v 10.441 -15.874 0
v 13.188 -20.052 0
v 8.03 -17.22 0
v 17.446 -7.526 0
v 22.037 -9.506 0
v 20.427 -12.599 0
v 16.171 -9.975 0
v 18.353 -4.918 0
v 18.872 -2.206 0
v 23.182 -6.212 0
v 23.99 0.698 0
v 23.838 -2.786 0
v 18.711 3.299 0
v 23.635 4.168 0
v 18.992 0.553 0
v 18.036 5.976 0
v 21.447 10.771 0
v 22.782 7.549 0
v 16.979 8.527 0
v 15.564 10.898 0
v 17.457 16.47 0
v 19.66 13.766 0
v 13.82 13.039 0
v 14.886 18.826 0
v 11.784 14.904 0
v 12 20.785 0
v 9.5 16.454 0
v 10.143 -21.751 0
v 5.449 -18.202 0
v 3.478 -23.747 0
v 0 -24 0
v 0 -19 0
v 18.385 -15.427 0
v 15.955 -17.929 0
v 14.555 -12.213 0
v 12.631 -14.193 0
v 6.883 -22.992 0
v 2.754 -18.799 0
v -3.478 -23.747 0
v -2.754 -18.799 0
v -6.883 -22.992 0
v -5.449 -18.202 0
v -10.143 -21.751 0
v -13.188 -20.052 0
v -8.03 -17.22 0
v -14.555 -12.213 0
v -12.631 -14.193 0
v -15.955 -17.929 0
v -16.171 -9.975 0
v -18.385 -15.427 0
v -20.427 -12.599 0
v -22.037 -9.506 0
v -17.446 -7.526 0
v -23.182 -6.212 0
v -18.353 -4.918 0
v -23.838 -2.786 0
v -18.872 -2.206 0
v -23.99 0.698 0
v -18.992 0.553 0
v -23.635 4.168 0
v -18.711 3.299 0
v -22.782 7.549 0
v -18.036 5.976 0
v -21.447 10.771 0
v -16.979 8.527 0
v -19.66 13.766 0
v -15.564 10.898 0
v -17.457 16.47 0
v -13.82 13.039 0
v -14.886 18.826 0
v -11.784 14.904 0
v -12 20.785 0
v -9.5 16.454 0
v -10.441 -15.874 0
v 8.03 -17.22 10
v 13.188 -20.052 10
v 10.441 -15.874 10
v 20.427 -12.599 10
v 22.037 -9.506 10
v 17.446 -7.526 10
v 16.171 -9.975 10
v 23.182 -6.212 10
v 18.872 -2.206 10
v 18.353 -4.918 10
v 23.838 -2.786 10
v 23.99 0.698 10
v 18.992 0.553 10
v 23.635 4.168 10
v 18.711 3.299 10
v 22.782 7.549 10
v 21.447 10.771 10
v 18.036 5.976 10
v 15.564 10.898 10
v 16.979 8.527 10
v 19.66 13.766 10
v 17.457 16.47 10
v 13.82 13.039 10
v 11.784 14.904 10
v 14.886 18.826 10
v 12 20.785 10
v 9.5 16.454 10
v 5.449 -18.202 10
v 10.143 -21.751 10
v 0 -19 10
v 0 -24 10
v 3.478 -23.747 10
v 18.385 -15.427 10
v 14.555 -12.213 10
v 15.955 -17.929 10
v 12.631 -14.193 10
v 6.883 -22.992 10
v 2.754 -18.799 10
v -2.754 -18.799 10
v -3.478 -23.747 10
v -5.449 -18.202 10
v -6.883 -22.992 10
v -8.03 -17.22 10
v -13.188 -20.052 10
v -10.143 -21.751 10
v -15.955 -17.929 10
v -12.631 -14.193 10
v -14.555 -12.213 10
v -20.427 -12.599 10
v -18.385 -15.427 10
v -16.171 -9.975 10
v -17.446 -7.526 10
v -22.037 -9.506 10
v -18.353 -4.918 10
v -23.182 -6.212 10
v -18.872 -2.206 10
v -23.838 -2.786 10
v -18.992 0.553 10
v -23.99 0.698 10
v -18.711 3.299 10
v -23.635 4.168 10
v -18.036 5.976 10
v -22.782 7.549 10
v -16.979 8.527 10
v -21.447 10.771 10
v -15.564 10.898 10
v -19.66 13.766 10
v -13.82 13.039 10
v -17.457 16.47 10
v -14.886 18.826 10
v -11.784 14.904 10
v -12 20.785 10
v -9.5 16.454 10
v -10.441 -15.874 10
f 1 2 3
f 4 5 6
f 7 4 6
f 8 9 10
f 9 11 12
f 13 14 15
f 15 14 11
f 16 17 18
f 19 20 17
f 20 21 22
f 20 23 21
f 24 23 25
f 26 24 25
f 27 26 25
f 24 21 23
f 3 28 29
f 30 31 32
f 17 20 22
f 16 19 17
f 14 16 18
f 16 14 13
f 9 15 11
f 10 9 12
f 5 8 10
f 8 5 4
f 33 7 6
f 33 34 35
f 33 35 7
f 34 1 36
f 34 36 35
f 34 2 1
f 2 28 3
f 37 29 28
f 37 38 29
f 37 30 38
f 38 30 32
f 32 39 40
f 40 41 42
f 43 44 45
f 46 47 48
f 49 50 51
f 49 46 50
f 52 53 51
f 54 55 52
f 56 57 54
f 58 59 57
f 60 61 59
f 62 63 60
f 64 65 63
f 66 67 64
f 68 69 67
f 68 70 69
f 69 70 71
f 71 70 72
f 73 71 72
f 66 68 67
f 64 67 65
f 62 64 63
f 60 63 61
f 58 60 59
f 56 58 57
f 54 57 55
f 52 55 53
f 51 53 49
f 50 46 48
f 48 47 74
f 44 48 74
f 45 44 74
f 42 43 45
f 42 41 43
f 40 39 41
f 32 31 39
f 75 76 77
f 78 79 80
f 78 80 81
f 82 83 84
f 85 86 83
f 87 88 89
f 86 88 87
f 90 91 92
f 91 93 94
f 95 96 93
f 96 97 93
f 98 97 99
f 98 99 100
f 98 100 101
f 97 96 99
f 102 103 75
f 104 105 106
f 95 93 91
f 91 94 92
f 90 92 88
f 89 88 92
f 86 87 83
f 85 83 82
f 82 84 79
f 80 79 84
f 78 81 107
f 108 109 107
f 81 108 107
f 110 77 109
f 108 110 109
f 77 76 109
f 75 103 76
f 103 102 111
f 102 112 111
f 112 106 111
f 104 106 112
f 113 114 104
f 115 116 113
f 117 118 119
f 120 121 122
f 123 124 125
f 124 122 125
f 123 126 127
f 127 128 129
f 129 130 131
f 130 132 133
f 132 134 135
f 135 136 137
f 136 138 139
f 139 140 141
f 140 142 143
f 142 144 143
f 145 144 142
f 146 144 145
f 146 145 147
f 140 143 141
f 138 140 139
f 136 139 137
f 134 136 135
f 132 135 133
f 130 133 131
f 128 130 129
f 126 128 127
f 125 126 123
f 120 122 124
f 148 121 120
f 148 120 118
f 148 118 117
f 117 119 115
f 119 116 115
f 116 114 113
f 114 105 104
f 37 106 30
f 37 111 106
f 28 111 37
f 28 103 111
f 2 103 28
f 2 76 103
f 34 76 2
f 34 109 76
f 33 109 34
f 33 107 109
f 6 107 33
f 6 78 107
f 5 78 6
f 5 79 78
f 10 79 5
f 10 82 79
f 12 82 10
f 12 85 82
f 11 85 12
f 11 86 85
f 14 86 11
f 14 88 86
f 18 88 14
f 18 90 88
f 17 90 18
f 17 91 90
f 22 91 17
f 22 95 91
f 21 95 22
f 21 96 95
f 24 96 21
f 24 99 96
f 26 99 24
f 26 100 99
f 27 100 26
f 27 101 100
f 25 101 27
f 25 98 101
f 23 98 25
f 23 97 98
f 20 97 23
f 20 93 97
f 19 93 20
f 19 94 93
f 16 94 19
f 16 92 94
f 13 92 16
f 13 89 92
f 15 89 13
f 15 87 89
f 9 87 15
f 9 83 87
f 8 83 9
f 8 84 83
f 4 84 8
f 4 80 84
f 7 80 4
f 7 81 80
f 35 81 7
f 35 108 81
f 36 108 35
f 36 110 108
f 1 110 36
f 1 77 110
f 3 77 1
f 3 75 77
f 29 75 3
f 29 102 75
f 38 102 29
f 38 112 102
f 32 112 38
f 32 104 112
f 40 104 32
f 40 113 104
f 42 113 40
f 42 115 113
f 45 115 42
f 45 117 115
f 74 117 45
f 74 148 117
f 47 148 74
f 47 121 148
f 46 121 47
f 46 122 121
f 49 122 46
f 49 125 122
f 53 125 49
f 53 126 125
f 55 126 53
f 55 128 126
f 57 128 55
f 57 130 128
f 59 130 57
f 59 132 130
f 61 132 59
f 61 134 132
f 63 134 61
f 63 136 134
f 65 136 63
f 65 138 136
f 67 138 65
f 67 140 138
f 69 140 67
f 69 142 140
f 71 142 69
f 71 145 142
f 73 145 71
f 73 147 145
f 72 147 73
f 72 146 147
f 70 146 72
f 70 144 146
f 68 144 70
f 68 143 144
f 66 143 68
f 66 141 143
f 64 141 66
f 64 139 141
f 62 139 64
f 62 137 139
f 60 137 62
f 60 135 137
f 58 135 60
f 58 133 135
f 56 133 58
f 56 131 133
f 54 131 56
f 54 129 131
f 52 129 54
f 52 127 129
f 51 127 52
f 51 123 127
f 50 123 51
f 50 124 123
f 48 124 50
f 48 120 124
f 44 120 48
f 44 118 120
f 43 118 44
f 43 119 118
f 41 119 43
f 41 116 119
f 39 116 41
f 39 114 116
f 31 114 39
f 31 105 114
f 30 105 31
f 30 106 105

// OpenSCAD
$fn = 32;

// ----------------------------------------------------------------------
// Spring clip: 48 mm outside, 5 mm band, 60 degree opening
// ----------------------------------------------------------------------

// --- parameters (mm) ---
outer_r = 24;             // clip outside radius
inner_r = 19;             // clip bore radius
band = 5;                 // band thickness
clip_w = 10;              // clip width
opening = 60;             // opening angle

clip_profile = [[-12, 20.785], [-14.886, 18.826], [-17.457, 16.47], [-19.66, 13.766], [-21.447, 10.771], [-22.782, 7.549], [-23.635, 4.168], [-23.99, 0.698], [-23.838, -2.786], [-23.182, -6.212], [-22.037, -9.506], [-20.427, -12.599], [-18.385, -15.427], [-15.955, -17.929], [-13.188, -20.052], [-10.143, -21.751], [-6.883, -22.992], [-3.478, -23.747], [0, -24], [3.478, -23.747], [6.883, -22.992], [10.143, -21.751], [13.188, -20.052], [15.955, -17.929], [18.385, -15.427], [20.427, -12.599], [22.037, -9.506], [23.182, -6.212], [23.838, -2.786], [23.99, 0.698], [23.635, 4.168], [22.782, 7.549], [21.447, 10.771], [19.66, 13.766], [17.457, 16.47], [14.886, 18.826], [12, 20.785], [9.5, 16.454], [11.784, 14.904], [13.82, 13.039], [15.564, 10.898], [16.979, 8.527], [18.036, 5.976], [18.711, 3.299], [18.992, 0.553], [18.872, -2.206], [18.353, -4.918], [17.446, -7.526], [16.171, -9.975], [14.555, -12.213], [12.631, -14.193], [10.441, -15.874], [8.03, -17.22], [5.449, -18.202], [2.754, -18.799], [0, -19], [-2.754, -18.799], [-5.449, -18.202], [-8.03, -17.22], [-10.441, -15.874], [-12.631, -14.193], [-14.555, -12.213], [-16.171, -9.975], [-17.446, -7.526], [-18.353, -4.918], [-18.872, -2.206], [-18.992, 0.553], [-18.711, 3.299], [-18.036, 5.976], [-16.979, 8.527], [-15.564, 10.898], [-13.82, 13.039], [-11.784, 14.904], [-9.5, 16.454]];

difference() {
  union() {
    linear_extrude(height = clip_w) polygon(clip_profile);
  }
}
